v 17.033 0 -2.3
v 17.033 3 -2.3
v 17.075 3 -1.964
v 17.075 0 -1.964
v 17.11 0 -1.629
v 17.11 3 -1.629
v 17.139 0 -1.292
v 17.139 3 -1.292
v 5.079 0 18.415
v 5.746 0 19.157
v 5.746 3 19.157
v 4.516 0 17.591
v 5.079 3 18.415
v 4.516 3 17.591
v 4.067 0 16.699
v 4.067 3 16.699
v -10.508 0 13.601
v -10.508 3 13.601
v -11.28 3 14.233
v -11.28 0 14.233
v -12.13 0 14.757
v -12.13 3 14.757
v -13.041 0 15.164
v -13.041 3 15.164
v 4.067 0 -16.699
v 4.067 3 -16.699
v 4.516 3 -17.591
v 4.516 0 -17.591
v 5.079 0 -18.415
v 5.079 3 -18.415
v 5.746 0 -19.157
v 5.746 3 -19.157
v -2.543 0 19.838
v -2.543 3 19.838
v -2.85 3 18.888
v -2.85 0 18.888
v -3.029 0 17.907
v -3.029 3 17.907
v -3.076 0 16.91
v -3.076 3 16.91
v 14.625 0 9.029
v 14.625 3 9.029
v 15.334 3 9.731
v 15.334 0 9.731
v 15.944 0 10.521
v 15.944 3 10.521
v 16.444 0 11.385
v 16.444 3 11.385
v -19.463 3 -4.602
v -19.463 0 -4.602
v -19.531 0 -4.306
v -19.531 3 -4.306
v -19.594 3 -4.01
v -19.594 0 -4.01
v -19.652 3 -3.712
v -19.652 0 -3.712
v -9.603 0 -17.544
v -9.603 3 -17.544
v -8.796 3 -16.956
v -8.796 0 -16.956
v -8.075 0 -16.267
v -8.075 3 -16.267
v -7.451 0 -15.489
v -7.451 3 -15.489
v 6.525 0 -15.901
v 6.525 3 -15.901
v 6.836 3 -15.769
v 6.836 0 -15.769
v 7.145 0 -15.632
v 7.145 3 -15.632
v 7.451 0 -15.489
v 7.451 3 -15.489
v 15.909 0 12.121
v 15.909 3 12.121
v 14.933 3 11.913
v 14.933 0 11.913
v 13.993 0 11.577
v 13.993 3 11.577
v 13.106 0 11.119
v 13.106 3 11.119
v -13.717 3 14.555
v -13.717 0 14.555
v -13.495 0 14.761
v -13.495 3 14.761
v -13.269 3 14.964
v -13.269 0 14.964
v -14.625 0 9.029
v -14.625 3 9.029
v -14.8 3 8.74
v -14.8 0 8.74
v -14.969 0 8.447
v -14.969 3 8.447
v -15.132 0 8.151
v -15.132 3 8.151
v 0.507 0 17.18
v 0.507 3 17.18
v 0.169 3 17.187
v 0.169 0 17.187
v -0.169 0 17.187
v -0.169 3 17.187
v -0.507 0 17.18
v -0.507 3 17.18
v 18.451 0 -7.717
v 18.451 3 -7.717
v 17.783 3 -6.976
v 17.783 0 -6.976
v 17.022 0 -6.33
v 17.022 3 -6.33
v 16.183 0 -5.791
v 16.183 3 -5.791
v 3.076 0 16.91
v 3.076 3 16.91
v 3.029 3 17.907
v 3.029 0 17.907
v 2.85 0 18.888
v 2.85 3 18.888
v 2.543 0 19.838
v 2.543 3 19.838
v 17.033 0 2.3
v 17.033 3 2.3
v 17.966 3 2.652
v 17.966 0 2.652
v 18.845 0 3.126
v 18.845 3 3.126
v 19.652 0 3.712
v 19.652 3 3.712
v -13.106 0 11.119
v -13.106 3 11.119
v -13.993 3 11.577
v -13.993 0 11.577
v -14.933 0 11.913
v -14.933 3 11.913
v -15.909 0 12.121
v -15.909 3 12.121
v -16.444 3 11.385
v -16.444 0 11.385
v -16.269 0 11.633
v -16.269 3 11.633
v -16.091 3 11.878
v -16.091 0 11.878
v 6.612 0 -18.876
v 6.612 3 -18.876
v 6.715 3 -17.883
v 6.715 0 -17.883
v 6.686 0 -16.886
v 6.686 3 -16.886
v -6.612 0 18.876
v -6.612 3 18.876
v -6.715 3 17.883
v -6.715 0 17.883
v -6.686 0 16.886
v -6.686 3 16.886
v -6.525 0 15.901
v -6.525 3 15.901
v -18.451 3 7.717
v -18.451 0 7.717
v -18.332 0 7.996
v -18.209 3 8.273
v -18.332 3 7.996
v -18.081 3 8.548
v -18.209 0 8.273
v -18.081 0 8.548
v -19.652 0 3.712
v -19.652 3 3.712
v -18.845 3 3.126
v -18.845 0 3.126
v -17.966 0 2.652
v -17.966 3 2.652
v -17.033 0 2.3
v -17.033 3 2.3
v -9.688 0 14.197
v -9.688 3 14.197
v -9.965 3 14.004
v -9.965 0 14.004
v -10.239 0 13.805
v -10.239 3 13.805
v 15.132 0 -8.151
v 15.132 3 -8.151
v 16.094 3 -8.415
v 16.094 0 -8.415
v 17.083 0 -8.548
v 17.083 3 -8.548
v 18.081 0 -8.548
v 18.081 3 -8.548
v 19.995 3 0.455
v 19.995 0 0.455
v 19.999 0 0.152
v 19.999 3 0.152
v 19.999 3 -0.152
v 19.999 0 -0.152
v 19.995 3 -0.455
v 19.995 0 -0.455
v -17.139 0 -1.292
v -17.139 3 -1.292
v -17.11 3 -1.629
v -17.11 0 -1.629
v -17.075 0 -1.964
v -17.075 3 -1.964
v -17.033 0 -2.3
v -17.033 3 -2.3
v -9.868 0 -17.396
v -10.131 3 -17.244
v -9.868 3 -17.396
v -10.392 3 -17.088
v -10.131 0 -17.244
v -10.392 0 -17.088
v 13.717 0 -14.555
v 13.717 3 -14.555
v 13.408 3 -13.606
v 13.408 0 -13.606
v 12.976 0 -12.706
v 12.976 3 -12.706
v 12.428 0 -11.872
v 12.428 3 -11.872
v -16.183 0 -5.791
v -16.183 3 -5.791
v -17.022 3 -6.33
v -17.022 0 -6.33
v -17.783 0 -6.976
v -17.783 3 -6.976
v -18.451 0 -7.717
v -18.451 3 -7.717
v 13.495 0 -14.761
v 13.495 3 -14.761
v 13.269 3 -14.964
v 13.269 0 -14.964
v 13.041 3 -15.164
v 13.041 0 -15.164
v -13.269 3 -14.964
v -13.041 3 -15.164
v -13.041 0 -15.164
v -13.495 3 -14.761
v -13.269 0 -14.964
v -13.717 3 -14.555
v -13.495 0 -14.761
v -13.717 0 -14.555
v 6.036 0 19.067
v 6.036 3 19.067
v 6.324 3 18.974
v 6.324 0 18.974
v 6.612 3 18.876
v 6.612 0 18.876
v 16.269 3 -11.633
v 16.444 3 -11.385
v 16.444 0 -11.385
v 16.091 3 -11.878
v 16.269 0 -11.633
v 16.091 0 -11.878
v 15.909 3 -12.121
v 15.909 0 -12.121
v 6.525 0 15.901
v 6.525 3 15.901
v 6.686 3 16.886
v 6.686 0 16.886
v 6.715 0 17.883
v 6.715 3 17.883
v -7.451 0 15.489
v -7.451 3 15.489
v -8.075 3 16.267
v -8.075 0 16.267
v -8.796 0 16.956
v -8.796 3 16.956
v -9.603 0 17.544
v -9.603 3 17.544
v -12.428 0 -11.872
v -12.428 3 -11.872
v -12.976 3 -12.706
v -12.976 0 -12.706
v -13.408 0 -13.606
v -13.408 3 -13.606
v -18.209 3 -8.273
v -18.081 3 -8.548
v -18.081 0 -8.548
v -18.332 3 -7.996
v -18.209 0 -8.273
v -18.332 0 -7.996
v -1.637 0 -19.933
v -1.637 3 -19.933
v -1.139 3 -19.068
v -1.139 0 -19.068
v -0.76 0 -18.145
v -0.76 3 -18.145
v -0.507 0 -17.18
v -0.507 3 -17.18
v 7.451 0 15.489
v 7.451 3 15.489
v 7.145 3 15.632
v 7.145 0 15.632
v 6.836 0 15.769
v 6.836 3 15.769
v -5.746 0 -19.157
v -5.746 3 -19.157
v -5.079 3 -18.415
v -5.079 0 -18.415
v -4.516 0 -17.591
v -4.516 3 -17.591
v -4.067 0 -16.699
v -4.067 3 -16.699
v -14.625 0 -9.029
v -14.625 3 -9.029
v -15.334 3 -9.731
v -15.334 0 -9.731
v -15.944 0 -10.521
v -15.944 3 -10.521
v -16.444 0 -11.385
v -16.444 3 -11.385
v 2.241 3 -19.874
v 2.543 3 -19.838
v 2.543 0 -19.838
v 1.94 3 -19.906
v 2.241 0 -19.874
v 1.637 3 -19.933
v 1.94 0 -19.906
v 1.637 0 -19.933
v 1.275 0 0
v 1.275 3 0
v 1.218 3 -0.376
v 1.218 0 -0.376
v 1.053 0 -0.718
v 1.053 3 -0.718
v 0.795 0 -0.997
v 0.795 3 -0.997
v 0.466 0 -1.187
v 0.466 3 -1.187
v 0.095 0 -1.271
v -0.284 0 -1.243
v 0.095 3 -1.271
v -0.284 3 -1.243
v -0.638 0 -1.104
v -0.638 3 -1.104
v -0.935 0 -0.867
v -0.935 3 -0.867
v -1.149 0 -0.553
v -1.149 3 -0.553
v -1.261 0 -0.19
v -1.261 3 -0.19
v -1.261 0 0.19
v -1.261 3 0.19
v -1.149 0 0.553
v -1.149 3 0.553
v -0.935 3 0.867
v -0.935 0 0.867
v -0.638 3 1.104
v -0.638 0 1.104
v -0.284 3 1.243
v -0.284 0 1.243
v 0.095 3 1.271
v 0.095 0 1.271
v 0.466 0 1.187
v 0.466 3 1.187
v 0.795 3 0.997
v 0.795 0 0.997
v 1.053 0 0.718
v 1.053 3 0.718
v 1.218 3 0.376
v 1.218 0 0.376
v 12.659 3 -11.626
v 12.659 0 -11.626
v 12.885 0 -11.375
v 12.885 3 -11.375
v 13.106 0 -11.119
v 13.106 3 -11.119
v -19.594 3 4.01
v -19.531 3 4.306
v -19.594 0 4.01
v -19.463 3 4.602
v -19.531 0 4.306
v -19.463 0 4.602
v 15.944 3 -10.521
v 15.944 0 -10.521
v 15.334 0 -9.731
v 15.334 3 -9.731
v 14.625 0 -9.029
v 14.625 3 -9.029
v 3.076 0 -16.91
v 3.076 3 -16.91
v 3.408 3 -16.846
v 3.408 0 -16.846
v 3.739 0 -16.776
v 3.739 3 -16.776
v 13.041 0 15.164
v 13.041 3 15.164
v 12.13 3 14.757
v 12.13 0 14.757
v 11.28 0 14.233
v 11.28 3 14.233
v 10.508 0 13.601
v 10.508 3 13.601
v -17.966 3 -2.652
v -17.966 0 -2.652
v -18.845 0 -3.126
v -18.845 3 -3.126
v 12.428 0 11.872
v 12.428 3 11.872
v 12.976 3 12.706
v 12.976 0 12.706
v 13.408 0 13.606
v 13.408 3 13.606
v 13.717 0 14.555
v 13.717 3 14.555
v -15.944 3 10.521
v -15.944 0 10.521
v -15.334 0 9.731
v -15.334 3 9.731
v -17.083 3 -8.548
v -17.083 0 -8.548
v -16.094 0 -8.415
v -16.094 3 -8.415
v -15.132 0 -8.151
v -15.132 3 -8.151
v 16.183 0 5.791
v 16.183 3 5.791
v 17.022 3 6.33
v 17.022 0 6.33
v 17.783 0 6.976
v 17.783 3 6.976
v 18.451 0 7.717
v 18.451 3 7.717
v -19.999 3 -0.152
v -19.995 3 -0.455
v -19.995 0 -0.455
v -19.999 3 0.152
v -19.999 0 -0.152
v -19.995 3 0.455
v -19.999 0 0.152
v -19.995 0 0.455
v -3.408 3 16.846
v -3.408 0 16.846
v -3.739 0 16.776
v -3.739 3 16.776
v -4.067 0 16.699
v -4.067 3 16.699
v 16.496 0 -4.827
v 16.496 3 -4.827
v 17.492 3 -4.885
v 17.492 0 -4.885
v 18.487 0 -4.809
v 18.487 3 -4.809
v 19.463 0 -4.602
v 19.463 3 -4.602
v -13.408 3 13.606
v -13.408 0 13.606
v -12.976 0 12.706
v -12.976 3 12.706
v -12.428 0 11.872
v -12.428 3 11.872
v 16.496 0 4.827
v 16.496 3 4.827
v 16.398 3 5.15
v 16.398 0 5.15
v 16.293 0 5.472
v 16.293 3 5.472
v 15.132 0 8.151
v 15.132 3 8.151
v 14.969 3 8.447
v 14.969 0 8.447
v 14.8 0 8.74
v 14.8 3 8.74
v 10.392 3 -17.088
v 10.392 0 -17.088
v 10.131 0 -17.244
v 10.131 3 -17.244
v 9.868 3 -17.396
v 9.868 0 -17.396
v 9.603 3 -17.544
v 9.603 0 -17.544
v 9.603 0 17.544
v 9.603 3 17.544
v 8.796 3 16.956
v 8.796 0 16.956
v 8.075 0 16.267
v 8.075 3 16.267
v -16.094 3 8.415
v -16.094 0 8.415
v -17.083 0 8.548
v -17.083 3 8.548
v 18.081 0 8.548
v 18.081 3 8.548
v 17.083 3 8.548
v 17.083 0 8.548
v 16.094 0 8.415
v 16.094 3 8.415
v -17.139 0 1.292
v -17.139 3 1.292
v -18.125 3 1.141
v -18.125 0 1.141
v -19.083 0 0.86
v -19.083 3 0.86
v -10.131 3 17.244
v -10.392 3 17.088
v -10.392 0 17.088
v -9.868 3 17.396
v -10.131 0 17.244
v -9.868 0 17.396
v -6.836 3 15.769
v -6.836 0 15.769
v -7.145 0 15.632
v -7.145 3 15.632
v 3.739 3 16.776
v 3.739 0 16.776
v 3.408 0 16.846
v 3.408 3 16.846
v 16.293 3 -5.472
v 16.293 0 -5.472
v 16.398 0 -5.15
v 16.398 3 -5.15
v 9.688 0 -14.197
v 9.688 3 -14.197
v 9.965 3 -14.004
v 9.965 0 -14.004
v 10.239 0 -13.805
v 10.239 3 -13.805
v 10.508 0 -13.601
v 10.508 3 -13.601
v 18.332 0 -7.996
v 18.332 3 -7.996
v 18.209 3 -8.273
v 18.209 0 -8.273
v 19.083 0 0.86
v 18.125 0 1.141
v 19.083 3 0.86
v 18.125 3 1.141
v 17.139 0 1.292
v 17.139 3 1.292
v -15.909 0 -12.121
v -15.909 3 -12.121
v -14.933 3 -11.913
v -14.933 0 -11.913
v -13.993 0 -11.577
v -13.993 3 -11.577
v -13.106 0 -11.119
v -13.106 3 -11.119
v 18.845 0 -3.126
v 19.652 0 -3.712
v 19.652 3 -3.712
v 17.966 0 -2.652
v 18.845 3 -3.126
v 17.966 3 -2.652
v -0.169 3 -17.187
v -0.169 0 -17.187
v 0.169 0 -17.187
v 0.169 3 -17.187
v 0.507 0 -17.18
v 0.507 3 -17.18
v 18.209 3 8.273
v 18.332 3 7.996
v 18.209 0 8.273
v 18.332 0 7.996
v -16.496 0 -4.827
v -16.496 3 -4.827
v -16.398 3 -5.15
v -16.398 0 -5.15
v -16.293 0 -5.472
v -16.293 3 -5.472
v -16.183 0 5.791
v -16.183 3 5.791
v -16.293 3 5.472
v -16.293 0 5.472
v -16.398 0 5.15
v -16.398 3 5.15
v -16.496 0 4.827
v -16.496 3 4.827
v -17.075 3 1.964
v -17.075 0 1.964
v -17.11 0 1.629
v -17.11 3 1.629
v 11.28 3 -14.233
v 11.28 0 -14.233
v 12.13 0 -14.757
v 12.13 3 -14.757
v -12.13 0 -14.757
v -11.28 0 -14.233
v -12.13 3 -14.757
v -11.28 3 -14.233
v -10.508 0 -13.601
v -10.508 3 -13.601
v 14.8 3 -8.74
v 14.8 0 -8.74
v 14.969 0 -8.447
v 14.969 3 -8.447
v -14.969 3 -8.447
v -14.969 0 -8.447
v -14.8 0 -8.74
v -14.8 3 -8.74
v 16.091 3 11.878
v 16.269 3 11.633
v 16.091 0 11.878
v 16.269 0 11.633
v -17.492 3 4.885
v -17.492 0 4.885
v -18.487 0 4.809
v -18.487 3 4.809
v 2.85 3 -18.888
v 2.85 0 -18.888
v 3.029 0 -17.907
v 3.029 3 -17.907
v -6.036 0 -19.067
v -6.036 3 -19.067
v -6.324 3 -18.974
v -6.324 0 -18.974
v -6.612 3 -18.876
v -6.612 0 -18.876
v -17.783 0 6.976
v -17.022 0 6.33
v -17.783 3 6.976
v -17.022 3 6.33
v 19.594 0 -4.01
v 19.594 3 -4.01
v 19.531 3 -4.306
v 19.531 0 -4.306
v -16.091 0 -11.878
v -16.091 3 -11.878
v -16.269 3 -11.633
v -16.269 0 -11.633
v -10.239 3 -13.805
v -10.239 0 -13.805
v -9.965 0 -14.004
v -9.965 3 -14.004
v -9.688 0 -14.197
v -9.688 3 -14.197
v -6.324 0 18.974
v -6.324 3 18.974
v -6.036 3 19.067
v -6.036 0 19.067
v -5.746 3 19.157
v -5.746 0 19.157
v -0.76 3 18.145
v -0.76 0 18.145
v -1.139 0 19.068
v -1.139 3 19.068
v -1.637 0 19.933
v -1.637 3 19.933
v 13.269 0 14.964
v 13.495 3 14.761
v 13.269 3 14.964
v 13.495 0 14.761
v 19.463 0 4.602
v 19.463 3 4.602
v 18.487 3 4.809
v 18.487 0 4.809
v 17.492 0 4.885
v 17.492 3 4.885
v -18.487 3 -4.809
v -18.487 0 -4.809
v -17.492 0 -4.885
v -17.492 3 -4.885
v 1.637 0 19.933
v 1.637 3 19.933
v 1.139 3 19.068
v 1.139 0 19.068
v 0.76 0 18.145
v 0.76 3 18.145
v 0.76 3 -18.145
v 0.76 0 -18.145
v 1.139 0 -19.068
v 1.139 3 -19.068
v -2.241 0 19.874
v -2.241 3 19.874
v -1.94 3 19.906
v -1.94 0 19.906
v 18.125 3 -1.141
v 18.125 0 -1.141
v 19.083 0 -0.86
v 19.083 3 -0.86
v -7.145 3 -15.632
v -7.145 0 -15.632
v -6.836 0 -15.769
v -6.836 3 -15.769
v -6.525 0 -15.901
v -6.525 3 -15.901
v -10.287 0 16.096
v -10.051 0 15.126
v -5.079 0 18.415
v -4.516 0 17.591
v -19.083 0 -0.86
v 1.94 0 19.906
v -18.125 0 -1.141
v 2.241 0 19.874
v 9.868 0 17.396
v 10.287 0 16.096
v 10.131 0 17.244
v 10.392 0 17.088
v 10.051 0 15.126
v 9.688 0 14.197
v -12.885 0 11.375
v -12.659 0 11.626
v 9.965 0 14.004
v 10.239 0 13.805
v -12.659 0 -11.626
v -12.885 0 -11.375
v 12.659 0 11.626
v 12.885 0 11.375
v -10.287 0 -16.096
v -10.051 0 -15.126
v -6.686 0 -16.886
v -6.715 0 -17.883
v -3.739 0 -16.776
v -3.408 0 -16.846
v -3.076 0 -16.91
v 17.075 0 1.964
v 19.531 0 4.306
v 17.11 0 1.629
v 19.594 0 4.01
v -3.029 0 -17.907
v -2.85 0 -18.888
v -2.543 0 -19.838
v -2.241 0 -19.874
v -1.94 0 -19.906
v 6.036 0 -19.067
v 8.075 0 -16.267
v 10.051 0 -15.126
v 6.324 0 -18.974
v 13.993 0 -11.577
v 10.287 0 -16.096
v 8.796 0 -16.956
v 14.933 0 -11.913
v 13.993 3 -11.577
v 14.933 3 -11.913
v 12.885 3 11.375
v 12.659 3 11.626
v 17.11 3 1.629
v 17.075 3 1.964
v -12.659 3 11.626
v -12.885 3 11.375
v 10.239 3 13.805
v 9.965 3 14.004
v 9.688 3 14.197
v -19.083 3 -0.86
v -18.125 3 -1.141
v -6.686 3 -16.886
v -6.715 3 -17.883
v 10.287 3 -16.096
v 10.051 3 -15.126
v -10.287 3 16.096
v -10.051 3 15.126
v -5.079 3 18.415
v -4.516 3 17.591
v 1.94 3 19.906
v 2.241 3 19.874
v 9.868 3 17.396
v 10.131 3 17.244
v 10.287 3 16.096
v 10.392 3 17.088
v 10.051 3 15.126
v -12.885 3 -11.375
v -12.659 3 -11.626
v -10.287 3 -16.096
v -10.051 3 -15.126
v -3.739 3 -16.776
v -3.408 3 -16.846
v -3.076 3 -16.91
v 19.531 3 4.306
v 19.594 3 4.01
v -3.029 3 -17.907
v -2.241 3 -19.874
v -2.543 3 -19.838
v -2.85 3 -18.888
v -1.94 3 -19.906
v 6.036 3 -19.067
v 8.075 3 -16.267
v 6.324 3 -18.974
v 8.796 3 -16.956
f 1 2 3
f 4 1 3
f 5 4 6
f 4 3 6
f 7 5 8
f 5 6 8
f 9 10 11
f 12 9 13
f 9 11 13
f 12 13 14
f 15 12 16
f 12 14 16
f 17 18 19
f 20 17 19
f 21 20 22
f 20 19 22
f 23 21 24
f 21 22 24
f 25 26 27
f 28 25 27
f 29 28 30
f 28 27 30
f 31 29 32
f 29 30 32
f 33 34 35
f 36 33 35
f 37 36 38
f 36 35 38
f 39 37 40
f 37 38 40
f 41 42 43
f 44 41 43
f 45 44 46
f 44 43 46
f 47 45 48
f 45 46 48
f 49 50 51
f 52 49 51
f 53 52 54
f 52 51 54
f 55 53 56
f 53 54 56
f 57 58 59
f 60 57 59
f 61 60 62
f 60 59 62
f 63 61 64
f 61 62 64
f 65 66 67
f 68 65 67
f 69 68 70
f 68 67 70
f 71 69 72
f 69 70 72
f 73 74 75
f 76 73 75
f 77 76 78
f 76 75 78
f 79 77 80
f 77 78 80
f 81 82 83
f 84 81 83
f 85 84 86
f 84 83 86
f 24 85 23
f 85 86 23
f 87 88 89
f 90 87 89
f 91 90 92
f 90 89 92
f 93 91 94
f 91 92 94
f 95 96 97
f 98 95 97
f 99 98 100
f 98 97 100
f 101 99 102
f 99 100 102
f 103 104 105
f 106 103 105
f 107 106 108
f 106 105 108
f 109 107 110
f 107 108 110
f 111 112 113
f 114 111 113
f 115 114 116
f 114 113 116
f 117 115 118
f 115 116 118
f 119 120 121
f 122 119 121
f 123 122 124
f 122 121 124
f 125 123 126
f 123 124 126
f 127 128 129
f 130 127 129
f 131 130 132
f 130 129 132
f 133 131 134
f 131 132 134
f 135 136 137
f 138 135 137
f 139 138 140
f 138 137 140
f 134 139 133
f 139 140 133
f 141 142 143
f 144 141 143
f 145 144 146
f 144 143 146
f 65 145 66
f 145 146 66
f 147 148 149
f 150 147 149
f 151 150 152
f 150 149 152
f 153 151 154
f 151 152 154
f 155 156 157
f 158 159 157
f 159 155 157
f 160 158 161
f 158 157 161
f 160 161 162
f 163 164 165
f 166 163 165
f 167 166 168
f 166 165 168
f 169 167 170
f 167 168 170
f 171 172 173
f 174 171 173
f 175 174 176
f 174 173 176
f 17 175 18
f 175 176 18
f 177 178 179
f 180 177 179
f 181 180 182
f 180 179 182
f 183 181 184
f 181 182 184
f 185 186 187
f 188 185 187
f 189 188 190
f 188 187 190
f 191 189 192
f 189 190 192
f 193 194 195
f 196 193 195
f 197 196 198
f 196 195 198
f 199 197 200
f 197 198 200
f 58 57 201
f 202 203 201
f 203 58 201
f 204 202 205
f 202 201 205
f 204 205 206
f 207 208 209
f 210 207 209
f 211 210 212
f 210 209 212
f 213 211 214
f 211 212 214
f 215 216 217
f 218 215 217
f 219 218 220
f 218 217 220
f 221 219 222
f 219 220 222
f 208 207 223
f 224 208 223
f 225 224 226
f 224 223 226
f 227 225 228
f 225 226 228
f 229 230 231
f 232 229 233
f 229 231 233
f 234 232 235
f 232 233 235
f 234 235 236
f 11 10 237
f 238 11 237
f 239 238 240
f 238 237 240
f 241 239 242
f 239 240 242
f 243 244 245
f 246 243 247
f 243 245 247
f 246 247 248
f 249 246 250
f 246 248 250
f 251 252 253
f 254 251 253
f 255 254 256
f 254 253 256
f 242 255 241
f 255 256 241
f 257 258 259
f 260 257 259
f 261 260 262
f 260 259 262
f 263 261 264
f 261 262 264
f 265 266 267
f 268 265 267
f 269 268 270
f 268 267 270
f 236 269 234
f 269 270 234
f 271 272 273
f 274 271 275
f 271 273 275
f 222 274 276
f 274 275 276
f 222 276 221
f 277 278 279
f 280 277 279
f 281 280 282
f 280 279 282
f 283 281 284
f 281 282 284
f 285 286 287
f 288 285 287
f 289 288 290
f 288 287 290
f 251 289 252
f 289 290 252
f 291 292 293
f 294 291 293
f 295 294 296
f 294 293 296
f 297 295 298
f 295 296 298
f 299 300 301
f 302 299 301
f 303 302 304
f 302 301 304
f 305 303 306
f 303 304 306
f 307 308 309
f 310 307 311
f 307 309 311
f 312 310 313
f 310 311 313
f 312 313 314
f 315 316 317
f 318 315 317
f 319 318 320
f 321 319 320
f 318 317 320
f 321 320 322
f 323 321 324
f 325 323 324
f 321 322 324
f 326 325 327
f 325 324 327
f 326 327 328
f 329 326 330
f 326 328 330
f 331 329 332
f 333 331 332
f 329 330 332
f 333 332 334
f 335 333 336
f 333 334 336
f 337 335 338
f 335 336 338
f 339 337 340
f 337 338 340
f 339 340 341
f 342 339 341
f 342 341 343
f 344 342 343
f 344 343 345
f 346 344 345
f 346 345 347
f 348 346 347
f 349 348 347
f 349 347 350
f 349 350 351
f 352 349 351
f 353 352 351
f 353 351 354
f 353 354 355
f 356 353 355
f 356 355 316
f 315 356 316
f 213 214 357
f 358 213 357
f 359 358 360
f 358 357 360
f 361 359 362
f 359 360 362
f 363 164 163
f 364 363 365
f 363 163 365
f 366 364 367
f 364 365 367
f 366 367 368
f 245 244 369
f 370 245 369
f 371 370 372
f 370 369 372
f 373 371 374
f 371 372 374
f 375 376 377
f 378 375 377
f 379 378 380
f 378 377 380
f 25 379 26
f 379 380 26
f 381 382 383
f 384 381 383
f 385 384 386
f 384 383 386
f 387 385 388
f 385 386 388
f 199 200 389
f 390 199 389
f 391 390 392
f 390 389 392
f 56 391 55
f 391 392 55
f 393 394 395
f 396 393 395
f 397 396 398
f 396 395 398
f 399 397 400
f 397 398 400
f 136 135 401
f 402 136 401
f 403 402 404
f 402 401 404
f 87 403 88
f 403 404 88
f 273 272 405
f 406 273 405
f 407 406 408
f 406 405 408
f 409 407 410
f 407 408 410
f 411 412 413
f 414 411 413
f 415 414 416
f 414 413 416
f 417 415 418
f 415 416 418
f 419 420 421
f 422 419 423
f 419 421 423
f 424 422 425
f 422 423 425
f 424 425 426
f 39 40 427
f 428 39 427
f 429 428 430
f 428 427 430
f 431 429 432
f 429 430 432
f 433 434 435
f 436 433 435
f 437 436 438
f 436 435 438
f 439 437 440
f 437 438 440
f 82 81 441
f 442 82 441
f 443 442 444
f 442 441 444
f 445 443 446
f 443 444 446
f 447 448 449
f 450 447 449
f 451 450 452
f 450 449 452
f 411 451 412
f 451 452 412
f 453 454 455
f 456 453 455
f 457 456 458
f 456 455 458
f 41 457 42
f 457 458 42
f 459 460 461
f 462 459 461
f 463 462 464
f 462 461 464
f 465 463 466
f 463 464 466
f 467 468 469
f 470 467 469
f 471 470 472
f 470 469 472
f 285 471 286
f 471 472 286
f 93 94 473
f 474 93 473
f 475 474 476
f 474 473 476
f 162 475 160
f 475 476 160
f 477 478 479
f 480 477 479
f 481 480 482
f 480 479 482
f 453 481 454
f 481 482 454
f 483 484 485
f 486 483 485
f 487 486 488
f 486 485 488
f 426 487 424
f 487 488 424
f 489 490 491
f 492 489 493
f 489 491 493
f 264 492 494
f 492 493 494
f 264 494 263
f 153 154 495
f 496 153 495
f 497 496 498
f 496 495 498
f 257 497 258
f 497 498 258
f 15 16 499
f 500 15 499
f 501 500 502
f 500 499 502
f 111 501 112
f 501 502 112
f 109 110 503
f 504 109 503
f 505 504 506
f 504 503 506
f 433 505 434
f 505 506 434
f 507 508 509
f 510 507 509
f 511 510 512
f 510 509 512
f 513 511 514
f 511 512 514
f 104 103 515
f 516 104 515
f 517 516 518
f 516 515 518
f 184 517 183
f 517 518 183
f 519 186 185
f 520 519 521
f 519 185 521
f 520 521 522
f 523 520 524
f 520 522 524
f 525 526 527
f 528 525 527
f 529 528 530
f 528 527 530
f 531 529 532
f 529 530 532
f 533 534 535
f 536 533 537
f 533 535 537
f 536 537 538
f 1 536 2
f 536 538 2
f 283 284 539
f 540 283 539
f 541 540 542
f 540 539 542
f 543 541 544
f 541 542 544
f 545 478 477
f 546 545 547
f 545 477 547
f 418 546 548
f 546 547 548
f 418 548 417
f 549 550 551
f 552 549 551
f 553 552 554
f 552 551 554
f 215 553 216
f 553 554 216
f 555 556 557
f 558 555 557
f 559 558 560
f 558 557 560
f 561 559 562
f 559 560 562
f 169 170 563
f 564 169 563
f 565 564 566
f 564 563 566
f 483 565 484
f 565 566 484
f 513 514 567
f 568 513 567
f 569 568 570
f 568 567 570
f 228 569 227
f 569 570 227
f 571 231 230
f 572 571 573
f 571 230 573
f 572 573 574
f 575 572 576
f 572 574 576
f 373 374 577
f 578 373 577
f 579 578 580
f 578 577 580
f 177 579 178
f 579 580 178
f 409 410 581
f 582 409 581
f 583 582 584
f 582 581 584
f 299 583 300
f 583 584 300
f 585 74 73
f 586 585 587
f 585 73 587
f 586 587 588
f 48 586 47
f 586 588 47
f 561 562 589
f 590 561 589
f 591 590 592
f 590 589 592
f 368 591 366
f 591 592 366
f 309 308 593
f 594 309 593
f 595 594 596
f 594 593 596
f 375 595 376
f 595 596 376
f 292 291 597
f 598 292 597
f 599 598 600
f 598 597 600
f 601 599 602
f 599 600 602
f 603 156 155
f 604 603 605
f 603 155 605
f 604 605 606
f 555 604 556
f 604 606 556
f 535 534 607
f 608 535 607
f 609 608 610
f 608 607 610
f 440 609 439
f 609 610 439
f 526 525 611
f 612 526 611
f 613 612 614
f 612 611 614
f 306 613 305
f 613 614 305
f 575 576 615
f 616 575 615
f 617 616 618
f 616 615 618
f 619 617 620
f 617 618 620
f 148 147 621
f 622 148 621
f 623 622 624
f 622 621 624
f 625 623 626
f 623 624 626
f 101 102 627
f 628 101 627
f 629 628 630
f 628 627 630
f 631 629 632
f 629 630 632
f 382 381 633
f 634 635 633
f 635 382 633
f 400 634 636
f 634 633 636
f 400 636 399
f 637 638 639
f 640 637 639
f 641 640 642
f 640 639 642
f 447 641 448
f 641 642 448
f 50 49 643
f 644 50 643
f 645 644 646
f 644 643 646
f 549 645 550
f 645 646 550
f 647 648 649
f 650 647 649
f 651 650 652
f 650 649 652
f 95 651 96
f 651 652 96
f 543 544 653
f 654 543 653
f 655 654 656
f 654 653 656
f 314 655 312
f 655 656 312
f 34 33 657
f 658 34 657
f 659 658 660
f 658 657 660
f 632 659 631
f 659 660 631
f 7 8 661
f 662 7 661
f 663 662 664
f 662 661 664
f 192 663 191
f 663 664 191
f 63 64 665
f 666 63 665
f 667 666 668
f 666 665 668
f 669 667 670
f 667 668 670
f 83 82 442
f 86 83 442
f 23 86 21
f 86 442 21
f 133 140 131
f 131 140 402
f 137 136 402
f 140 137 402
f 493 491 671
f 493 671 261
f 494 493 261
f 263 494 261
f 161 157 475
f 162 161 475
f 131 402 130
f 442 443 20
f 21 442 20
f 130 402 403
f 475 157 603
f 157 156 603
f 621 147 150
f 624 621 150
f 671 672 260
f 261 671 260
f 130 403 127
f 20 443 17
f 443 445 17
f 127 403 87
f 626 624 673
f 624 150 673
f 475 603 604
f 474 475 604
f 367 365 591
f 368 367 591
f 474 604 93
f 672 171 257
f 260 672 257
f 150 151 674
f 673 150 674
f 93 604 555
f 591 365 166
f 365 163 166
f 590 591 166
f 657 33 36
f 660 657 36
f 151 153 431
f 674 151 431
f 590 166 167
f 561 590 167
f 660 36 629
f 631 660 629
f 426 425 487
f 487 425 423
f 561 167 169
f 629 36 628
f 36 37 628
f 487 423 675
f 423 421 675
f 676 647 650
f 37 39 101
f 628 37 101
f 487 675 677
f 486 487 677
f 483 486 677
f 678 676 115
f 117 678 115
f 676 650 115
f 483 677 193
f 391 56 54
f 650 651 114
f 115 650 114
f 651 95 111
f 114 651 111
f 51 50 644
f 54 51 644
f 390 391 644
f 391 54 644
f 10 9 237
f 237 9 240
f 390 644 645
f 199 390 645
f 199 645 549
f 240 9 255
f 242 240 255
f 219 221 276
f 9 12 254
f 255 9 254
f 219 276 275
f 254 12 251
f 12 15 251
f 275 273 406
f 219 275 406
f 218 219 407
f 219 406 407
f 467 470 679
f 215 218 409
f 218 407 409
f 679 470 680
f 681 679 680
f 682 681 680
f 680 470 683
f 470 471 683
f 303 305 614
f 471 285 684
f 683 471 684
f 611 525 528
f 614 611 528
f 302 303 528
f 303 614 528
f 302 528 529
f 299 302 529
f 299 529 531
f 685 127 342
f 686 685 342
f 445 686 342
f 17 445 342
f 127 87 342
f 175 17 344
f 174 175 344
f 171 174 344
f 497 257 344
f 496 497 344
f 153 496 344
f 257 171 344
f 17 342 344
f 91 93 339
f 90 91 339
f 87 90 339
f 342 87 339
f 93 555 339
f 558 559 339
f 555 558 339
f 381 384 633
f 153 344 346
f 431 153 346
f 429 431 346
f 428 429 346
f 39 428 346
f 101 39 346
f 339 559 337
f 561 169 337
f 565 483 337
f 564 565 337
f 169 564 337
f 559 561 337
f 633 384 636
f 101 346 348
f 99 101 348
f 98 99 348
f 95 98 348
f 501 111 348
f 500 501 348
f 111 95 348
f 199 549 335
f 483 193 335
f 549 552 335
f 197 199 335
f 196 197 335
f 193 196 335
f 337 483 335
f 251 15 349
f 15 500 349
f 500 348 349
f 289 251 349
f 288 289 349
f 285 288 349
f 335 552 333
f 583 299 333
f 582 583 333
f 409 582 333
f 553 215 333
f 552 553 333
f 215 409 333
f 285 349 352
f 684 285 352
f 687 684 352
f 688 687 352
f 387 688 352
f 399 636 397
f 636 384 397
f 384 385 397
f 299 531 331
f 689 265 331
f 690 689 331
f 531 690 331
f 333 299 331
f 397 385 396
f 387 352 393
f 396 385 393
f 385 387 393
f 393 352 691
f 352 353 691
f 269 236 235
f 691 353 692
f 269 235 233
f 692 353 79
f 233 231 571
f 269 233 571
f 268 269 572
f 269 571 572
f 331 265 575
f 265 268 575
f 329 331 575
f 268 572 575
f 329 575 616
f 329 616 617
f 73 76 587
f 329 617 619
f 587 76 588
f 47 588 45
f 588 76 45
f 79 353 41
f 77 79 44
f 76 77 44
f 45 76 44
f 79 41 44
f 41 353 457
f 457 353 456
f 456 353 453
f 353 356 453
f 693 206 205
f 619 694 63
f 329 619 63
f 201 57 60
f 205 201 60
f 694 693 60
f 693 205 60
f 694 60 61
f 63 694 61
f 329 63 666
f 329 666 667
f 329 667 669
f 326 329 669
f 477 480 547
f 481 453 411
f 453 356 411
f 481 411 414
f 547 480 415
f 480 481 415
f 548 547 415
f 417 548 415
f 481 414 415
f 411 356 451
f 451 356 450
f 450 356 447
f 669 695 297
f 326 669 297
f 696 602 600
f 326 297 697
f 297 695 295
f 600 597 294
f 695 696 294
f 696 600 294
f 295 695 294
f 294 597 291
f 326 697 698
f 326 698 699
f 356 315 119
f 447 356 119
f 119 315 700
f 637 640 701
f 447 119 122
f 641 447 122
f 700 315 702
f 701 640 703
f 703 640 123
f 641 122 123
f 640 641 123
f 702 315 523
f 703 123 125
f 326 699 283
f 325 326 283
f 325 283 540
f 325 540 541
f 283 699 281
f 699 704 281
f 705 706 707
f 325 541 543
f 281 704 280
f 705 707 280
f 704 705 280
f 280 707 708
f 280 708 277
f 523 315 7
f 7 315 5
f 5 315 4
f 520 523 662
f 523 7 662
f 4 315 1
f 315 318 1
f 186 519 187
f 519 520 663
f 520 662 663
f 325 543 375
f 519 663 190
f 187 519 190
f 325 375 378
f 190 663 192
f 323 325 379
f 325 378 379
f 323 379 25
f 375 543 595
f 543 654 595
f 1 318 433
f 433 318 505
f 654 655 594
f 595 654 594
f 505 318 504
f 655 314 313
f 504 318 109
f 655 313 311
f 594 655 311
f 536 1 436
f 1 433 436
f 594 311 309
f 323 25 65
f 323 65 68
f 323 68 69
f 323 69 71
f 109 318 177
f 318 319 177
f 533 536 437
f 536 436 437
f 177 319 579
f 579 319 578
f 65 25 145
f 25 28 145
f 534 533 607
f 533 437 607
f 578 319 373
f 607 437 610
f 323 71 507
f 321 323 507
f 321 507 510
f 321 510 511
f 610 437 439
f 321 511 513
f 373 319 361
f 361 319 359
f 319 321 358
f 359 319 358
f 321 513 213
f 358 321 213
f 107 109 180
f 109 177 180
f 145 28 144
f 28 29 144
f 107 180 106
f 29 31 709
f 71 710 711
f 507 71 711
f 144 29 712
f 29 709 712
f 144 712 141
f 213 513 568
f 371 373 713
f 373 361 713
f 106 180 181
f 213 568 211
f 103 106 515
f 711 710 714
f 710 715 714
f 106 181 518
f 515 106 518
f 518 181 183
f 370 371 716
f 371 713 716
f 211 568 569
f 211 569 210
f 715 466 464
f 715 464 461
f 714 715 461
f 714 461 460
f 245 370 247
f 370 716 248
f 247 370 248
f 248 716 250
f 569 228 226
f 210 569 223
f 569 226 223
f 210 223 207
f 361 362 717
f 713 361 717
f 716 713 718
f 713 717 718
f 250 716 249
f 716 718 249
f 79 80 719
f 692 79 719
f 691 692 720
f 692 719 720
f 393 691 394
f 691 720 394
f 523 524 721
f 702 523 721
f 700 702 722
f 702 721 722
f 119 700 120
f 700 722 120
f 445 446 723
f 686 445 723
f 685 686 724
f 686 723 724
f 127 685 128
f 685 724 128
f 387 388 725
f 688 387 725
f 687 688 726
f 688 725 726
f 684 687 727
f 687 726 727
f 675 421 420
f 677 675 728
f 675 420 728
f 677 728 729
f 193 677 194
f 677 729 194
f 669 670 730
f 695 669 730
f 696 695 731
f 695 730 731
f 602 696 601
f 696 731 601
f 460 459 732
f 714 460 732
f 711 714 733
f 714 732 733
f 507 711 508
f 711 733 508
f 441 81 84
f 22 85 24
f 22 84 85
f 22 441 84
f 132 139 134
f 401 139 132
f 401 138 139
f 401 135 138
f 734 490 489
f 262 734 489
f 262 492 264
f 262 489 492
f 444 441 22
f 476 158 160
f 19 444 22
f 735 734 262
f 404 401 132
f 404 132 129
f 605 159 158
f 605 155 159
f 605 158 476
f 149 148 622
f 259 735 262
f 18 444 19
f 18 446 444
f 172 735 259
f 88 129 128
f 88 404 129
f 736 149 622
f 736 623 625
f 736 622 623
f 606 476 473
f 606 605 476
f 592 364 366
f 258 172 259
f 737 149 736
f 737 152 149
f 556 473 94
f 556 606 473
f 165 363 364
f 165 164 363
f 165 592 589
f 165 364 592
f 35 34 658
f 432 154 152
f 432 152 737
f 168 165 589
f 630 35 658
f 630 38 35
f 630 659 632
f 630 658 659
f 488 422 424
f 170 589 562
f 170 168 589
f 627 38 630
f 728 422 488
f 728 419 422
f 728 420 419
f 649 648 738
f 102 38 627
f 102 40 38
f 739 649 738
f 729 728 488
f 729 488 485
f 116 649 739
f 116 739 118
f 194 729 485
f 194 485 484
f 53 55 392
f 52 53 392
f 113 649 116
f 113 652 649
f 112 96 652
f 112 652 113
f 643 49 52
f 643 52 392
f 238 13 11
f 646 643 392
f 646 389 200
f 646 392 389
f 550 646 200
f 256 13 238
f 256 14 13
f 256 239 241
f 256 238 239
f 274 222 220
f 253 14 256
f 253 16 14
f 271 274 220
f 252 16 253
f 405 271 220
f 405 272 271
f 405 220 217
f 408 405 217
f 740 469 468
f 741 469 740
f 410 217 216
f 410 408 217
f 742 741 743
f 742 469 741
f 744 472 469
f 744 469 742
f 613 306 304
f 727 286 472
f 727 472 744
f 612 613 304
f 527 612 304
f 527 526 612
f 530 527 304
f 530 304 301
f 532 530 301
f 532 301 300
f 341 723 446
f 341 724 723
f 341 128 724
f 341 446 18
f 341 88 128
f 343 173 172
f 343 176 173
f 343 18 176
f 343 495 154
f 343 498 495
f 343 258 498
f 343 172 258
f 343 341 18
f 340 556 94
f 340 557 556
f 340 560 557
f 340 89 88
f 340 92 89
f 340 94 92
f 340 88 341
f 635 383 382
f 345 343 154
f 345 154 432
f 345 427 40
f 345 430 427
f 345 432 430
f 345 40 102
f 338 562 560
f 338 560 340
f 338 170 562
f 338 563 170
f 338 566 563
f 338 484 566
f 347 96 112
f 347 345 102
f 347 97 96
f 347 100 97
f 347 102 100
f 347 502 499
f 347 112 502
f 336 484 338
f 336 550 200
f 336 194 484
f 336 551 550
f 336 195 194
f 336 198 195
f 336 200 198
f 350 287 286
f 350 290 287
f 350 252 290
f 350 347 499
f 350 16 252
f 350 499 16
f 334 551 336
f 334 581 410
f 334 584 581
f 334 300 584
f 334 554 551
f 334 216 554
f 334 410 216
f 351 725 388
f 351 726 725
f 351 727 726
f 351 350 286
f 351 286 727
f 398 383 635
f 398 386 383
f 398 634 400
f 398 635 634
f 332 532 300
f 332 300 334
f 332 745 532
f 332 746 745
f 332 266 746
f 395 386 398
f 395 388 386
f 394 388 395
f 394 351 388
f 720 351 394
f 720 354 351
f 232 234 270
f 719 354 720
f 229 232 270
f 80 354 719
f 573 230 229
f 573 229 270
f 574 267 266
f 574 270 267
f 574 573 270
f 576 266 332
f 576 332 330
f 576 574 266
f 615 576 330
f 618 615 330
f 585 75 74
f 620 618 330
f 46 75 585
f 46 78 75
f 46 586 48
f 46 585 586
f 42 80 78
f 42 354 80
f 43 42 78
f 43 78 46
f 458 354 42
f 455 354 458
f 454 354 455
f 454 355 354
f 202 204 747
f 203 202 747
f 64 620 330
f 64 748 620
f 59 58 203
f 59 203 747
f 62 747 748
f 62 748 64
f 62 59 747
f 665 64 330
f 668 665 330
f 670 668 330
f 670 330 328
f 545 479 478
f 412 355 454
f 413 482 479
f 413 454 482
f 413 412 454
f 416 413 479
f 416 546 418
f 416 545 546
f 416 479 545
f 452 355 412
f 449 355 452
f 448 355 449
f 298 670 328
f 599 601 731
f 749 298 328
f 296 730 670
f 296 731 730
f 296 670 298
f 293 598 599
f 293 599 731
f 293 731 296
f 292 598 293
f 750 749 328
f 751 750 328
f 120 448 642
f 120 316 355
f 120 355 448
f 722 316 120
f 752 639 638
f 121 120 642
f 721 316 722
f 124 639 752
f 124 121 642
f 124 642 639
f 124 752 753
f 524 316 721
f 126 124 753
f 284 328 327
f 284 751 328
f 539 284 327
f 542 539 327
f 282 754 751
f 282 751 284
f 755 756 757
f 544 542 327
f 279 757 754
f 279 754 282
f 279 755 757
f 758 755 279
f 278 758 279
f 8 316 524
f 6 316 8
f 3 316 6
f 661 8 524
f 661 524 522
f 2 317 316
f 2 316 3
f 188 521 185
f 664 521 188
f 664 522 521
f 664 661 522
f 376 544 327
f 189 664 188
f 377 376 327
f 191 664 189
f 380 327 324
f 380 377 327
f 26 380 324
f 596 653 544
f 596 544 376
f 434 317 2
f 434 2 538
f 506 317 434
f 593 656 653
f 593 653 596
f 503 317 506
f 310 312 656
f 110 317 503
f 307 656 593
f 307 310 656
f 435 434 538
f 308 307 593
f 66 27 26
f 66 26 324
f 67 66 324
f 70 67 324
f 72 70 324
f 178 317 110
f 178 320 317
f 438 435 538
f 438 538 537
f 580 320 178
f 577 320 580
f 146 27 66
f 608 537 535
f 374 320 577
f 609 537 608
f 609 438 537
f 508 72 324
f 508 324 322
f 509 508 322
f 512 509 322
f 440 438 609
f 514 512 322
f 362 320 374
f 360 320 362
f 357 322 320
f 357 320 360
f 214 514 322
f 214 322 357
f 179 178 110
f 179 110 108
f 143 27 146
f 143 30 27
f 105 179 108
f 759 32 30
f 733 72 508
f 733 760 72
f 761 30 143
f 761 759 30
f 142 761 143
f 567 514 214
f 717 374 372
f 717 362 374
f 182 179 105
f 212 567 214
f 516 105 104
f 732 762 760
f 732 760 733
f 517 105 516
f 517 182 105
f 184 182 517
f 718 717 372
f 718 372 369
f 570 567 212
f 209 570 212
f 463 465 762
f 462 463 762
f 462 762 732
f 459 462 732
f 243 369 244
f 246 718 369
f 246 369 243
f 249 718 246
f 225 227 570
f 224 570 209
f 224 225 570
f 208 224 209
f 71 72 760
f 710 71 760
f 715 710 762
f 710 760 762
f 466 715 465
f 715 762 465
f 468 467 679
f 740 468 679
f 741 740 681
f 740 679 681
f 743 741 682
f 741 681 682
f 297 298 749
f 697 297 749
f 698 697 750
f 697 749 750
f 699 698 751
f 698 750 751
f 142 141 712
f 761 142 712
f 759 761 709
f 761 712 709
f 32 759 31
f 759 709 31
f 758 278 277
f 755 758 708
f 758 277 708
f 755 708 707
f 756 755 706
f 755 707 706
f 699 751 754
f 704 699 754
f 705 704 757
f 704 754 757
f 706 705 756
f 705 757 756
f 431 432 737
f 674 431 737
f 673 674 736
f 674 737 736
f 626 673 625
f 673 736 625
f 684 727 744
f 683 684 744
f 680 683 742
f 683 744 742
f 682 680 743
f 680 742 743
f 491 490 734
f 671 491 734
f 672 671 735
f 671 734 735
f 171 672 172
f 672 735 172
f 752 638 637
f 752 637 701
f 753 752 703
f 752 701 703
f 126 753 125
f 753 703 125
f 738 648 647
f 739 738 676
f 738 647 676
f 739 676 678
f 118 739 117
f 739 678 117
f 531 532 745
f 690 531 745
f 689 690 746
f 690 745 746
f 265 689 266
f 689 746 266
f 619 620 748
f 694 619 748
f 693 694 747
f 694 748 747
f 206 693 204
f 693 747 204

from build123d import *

# Parameters (mm, degrees)
SKETCH1_R           = 20
BOSS_EXTRUDE1_DEPTH = 3
CUT_EXTRUDE1_DEPTH  = 4
CIRPATTERN1_COUNT   = 30
SKETCH7_R           = 1.275
CUT_EXTRUDE6_DEPTH  = 4


with BuildPart() as part:
    # Sketch1 → Boss-Extrude1 (new body)
    with BuildSketch(Plane(origin=(0, 0, 0), x_dir=(1, 0, 0), z_dir=(0, 1, 0))):
        Circle(SKETCH1_R)
    extrude(amount=BOSS_EXTRUDE1_DEPTH)

    # Sketch2 → Cut-Extrude1 (cut, through all)
    with BuildSketch(Plane(origin=(0, 3, 0), x_dir=(1, 0, 0), z_dir=(0, 1, 0))):
        with BuildLine():
            ThreePointArc((-0.506578607, 17.180033014), (0, 17.1875), (0.506578607, 17.180033014))
            ThreePointArc((0.506578607, 17.180033014), (0.934108373, 18.613100259), (1.637465265, 19.932854976))
            ThreePointArc((1.637465265, 19.932854976), (0, 20), (-1.637465265, 19.932854976))
            ThreePointArc((-1.637465265, 19.932854976), (-0.934108373, 18.613100259), (-0.506578607, 17.180033014))
        make_face()
    cut_extrude1 = extrude(amount=-CUT_EXTRUDE1_DEPTH, mode=Mode.SUBTRACT)

    # CirPattern1: Cut-Extrude1 ×30 about axis
    cirpattern1_axis = Axis((0, 0, 0), (0, 1, 0))
    for i in range(1, CIRPATTERN1_COUNT):
        add(cut_extrude1.rotate(cirpattern1_axis, i * 360 / CIRPATTERN1_COUNT), mode=Mode.SUBTRACT)

    # Sketch7 → Cut-Extrude6 (cut, through all)
    with BuildSketch(Plane(origin=(0, 3, 0), x_dir=(1, 0, 0), z_dir=(0, 1, 0))):
        Circle(SKETCH7_R)
    extrude(amount=-CUT_EXTRUDE6_DEPTH, mode=Mode.SUBTRACT)


solid = part.part
